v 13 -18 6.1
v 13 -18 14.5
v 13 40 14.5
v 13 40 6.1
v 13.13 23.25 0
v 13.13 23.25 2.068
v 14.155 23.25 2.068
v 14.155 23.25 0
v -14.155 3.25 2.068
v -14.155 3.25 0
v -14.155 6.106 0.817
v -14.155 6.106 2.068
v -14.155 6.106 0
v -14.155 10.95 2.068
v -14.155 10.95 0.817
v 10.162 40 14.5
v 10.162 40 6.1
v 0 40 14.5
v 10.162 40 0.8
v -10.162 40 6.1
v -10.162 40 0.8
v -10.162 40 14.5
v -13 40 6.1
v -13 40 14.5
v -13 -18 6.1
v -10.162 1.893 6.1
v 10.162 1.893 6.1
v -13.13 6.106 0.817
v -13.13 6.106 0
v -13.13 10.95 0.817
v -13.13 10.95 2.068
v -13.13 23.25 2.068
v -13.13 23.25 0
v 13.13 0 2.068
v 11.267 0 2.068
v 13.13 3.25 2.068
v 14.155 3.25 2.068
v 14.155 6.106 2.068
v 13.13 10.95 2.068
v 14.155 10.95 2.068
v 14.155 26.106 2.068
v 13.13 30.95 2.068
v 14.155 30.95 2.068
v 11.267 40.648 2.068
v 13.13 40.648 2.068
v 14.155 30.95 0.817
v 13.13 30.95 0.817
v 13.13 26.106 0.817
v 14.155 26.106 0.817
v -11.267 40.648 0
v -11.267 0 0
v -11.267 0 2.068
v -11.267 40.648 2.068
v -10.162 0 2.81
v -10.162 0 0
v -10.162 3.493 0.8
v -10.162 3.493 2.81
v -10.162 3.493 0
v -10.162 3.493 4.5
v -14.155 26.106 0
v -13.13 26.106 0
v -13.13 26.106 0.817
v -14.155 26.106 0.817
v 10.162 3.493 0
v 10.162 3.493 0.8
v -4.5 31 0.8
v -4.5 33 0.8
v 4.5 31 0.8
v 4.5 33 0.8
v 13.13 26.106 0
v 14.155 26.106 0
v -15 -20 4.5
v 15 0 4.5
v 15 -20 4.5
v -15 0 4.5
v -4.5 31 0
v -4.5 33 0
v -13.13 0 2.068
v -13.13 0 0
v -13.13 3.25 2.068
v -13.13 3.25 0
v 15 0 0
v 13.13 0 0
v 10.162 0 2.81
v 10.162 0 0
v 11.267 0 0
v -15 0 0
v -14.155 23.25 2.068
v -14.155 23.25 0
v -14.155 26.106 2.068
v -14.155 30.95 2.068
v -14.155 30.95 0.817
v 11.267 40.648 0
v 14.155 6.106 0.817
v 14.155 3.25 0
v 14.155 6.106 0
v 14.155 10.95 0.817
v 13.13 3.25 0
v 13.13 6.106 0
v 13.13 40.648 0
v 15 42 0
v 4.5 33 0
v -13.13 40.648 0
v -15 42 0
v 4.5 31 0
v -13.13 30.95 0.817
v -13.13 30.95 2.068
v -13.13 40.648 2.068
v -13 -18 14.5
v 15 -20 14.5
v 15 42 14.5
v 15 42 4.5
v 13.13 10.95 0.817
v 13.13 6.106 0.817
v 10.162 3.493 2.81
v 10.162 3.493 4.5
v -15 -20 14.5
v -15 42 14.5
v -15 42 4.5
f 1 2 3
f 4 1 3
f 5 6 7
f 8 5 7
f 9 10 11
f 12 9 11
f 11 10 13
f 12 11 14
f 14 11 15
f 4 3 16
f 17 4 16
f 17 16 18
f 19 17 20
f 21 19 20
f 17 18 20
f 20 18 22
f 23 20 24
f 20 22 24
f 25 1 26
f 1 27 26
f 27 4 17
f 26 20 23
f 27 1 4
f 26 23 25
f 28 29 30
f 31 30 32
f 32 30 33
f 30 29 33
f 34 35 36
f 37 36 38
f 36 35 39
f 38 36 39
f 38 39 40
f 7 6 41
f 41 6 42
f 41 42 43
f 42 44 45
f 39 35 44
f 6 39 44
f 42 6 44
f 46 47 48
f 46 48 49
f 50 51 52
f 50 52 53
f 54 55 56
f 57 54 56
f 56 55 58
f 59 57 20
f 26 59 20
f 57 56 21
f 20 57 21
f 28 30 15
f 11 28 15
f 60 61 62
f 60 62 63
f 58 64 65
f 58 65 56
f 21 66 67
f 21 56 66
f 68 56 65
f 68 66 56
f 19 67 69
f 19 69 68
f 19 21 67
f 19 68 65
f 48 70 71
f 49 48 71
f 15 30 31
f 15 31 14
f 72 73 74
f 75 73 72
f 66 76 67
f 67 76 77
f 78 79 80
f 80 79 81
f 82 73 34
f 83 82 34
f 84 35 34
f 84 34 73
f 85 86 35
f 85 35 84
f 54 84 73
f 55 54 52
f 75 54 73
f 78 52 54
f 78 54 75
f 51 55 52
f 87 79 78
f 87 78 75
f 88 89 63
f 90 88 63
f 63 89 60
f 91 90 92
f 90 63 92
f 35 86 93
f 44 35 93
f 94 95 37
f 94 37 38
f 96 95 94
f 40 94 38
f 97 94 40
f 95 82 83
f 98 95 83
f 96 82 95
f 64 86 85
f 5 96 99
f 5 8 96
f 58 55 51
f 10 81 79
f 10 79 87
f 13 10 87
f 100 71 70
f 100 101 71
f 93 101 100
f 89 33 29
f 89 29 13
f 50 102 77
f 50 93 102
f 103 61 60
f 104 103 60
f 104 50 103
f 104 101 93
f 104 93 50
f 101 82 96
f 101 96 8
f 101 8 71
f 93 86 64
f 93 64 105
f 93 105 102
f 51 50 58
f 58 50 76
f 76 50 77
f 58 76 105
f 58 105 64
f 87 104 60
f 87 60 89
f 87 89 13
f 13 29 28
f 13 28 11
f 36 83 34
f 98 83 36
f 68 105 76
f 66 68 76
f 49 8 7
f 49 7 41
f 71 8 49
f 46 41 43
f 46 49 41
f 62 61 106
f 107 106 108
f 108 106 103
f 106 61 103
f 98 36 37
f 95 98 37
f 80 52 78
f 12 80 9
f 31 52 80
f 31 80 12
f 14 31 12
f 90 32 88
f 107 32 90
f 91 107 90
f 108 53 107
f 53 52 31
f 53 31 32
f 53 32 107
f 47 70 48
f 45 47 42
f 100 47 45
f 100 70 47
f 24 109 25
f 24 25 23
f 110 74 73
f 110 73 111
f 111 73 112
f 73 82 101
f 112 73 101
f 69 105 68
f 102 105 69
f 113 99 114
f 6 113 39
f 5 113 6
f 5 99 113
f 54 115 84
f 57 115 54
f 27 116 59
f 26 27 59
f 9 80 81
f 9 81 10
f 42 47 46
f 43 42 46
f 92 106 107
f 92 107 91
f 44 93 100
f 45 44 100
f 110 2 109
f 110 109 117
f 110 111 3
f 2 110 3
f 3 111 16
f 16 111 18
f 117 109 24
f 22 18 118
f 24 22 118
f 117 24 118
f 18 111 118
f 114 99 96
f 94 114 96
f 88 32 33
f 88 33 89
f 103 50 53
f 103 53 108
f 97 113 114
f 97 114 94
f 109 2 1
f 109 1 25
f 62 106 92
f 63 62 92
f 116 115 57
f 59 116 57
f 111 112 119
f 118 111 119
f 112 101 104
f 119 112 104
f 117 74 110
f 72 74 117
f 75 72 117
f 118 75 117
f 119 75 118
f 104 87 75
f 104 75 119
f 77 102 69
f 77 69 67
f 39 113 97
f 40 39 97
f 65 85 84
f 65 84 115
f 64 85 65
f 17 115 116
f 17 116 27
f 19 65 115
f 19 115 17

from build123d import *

# Parameters (mm, degrees)
SKETCH4_W           = 29.99999933
SKETCH4_H           = 41.999999434
BOSS_EXTRUDE2_DEPTH = 4.499999806
SKETCH5_W           = 1.862979494
SKETCH5_H           = 40.647998452
CUT_EXTRUDE1_DEPTH  = 2.068
SKETCH2_W           = 1.025000587
SKETCH2_H           = 2.855999861
SKETCH2_H_2         = 2.855997533
CUT_EXTRUDE2_DEPTH  = 2.068
SKETCH3_W           = 1.025000587
SKETCH3_H           = 7.699999958
SKETCH3_H_2         = 7.699999959
CUT_EXTRUDE3_DEPTH  = 1.251
SKETCH6_W           = 8.999999612
SKETCH6_H           = 2.000000328
CUT_EXTRUDE4_DEPTH  = 1
SKETCH7_W           = 20.324639976
SKETCH7_H           = 3.493499942
CUT_EXTRUDE6_DEPTH  = 2.81
CUT_EXTRUDE7_DEPTH  = 3.699999806
SKETCH9_W           = 29.99999933
SKETCH9_H           = 61.999998987
SKETCH9_W_2         = 20.324639976
SKETCH9_H_2         = 36.506499492
BOSS_EXTRUDE3_DEPTH = 10
SKETCH10_W          = 25.99999933
SKETCH10_H          = 57.999998987
CUT_EXTRUDE8_DEPTH  = 8.4
CHAMFER1_SIZE       = 1.6


# Read off the part's stored shape, not the designer's step: Surface-Imported1
with BuildPart() as part:
    # Sketch4 → Boss-Extrude2 (new body)
    with BuildSketch(Plane.XY):
        with Locations((0, 20.999999717)):
            Rectangle(SKETCH4_W, SKETCH4_H)
    extrude(amount=BOSS_EXTRUDE2_DEPTH)

    # Sketch5 → Cut-Extrude1 (cut)
    with BuildSketch(Plane.XY):
        with Locations((-12.198510114, 20.323999226)):
            Rectangle(SKETCH5_W, SKETCH5_H)
        with Locations((12.198510114, 20.323999226)):
            Rectangle(SKETCH5_W, SKETCH5_H)
    extrude(amount=CUT_EXTRUDE1_DEPTH, mode=Mode.SUBTRACT)

    # Sketch2 → Cut-Extrude2 (cut)
    with BuildSketch(Plane.XY):
        with Locations((13.642500155, 4.677999998)):
            Rectangle(SKETCH2_W, SKETCH2_H)
        with Locations((13.642500155, 24.677999318)):
            Rectangle(SKETCH2_W, SKETCH2_H_2)
    extrude(amount=CUT_EXTRUDE2_DEPTH, mode=Mode.SUBTRACT)

    # Sketch3 → Cut-Extrude3 (cut)
    with BuildSketch(Plane.XY.offset(0.816999993)):
        with Locations((13.642500155, 7.100000046)):
            Rectangle(SKETCH3_W, SKETCH3_H)
        with Locations((13.642500155, 27.100000531)):
            Rectangle(SKETCH3_W, SKETCH3_H_2)
    extrude(amount=CUT_EXTRUDE3_DEPTH, mode=Mode.SUBTRACT)

    # Sketch6 → Cut-Extrude4 (cut)
    with BuildSketch(Plane.XY):
        with Locations((0, 31.999999657)):
            Rectangle(SKETCH6_W, SKETCH6_H)
    extrude(amount=CUT_EXTRUDE4_DEPTH, mode=Mode.SUBTRACT)

    # Sketch7 → Cut-Extrude6 (cut)
    with BuildSketch(Plane.XY):
        with Locations((0, 1.746749971)):
            Rectangle(SKETCH7_W, SKETCH7_H)
    extrude(amount=CUT_EXTRUDE6_DEPTH, mode=Mode.SUBTRACT)

    # Sketch8 → Cut-Extrude7 (cut)
    with BuildSketch(Plane.XY.offset(4.499999806)):
        Polygon((-9.362319988, 3.493499942), (-10.162319988, 3.493499942), (-10.162319988, 39.999999434), (10.162319988, 39.999999434), (10.162319988, 3.493499942), (9.362319988, 3.493499942), align=None)
    extrude(amount=-CUT_EXTRUDE7_DEPTH, mode=Mode.SUBTRACT)

    # Sketch9 → Boss-Extrude3 (add)
    with BuildSketch(Plane.XY.offset(4.499999806)):
        with Locations((0, 10.999999941)):
            Rectangle(SKETCH9_W, SKETCH9_H)
        with Locations((0, 21.746749688)):
            Rectangle(SKETCH9_W_2, SKETCH9_H_2, mode=Mode.SUBTRACT)
    extrude(amount=BOSS_EXTRUDE3_DEPTH)

    # Sketch10 → Cut-Extrude8 (cut)
    with BuildSketch(Plane.XY.offset(14.499999806)):
        with Locations((0, 10.999999941)):
            Rectangle(SKETCH10_W, SKETCH10_H)
    extrude(amount=-CUT_EXTRUDE8_DEPTH, mode=Mode.SUBTRACT)

    # Chamfer1
    chamfer1_edges = [part.edges().sort_by_distance(p)[0] for p in [
        (0, 3.493499942, 6.099999806),
    ]]
    chamfer(chamfer1_edges, length=CHAMFER1_SIZE)


with BuildPart() as body_2:
    # Split1: the piece on the far side of the plane
    add(part.part)
    split(bisect_by=Plane(origin=(0, 0, 0), x_dir=(0, 0, 1), z_dir=(1, 0, 0)), keep=Keep.BOTTOM)


with BuildPart() as part_1:
    add(part.part)

    # Split1
    split(bisect_by=Plane(origin=(0, 0, 0), x_dir=(0, 0, 1), z_dir=(1, 0, 0)), keep=Keep.TOP)

    # Mirror1: part across plane


with BuildPart() as part_2:
    add(part_1.part)
    add(part_1.part.mirror(Plane(origin=(0, 0, 0), x_dir=(0, 0, 1), z_dir=(1, 0, 0))))


solid = part_2.part
